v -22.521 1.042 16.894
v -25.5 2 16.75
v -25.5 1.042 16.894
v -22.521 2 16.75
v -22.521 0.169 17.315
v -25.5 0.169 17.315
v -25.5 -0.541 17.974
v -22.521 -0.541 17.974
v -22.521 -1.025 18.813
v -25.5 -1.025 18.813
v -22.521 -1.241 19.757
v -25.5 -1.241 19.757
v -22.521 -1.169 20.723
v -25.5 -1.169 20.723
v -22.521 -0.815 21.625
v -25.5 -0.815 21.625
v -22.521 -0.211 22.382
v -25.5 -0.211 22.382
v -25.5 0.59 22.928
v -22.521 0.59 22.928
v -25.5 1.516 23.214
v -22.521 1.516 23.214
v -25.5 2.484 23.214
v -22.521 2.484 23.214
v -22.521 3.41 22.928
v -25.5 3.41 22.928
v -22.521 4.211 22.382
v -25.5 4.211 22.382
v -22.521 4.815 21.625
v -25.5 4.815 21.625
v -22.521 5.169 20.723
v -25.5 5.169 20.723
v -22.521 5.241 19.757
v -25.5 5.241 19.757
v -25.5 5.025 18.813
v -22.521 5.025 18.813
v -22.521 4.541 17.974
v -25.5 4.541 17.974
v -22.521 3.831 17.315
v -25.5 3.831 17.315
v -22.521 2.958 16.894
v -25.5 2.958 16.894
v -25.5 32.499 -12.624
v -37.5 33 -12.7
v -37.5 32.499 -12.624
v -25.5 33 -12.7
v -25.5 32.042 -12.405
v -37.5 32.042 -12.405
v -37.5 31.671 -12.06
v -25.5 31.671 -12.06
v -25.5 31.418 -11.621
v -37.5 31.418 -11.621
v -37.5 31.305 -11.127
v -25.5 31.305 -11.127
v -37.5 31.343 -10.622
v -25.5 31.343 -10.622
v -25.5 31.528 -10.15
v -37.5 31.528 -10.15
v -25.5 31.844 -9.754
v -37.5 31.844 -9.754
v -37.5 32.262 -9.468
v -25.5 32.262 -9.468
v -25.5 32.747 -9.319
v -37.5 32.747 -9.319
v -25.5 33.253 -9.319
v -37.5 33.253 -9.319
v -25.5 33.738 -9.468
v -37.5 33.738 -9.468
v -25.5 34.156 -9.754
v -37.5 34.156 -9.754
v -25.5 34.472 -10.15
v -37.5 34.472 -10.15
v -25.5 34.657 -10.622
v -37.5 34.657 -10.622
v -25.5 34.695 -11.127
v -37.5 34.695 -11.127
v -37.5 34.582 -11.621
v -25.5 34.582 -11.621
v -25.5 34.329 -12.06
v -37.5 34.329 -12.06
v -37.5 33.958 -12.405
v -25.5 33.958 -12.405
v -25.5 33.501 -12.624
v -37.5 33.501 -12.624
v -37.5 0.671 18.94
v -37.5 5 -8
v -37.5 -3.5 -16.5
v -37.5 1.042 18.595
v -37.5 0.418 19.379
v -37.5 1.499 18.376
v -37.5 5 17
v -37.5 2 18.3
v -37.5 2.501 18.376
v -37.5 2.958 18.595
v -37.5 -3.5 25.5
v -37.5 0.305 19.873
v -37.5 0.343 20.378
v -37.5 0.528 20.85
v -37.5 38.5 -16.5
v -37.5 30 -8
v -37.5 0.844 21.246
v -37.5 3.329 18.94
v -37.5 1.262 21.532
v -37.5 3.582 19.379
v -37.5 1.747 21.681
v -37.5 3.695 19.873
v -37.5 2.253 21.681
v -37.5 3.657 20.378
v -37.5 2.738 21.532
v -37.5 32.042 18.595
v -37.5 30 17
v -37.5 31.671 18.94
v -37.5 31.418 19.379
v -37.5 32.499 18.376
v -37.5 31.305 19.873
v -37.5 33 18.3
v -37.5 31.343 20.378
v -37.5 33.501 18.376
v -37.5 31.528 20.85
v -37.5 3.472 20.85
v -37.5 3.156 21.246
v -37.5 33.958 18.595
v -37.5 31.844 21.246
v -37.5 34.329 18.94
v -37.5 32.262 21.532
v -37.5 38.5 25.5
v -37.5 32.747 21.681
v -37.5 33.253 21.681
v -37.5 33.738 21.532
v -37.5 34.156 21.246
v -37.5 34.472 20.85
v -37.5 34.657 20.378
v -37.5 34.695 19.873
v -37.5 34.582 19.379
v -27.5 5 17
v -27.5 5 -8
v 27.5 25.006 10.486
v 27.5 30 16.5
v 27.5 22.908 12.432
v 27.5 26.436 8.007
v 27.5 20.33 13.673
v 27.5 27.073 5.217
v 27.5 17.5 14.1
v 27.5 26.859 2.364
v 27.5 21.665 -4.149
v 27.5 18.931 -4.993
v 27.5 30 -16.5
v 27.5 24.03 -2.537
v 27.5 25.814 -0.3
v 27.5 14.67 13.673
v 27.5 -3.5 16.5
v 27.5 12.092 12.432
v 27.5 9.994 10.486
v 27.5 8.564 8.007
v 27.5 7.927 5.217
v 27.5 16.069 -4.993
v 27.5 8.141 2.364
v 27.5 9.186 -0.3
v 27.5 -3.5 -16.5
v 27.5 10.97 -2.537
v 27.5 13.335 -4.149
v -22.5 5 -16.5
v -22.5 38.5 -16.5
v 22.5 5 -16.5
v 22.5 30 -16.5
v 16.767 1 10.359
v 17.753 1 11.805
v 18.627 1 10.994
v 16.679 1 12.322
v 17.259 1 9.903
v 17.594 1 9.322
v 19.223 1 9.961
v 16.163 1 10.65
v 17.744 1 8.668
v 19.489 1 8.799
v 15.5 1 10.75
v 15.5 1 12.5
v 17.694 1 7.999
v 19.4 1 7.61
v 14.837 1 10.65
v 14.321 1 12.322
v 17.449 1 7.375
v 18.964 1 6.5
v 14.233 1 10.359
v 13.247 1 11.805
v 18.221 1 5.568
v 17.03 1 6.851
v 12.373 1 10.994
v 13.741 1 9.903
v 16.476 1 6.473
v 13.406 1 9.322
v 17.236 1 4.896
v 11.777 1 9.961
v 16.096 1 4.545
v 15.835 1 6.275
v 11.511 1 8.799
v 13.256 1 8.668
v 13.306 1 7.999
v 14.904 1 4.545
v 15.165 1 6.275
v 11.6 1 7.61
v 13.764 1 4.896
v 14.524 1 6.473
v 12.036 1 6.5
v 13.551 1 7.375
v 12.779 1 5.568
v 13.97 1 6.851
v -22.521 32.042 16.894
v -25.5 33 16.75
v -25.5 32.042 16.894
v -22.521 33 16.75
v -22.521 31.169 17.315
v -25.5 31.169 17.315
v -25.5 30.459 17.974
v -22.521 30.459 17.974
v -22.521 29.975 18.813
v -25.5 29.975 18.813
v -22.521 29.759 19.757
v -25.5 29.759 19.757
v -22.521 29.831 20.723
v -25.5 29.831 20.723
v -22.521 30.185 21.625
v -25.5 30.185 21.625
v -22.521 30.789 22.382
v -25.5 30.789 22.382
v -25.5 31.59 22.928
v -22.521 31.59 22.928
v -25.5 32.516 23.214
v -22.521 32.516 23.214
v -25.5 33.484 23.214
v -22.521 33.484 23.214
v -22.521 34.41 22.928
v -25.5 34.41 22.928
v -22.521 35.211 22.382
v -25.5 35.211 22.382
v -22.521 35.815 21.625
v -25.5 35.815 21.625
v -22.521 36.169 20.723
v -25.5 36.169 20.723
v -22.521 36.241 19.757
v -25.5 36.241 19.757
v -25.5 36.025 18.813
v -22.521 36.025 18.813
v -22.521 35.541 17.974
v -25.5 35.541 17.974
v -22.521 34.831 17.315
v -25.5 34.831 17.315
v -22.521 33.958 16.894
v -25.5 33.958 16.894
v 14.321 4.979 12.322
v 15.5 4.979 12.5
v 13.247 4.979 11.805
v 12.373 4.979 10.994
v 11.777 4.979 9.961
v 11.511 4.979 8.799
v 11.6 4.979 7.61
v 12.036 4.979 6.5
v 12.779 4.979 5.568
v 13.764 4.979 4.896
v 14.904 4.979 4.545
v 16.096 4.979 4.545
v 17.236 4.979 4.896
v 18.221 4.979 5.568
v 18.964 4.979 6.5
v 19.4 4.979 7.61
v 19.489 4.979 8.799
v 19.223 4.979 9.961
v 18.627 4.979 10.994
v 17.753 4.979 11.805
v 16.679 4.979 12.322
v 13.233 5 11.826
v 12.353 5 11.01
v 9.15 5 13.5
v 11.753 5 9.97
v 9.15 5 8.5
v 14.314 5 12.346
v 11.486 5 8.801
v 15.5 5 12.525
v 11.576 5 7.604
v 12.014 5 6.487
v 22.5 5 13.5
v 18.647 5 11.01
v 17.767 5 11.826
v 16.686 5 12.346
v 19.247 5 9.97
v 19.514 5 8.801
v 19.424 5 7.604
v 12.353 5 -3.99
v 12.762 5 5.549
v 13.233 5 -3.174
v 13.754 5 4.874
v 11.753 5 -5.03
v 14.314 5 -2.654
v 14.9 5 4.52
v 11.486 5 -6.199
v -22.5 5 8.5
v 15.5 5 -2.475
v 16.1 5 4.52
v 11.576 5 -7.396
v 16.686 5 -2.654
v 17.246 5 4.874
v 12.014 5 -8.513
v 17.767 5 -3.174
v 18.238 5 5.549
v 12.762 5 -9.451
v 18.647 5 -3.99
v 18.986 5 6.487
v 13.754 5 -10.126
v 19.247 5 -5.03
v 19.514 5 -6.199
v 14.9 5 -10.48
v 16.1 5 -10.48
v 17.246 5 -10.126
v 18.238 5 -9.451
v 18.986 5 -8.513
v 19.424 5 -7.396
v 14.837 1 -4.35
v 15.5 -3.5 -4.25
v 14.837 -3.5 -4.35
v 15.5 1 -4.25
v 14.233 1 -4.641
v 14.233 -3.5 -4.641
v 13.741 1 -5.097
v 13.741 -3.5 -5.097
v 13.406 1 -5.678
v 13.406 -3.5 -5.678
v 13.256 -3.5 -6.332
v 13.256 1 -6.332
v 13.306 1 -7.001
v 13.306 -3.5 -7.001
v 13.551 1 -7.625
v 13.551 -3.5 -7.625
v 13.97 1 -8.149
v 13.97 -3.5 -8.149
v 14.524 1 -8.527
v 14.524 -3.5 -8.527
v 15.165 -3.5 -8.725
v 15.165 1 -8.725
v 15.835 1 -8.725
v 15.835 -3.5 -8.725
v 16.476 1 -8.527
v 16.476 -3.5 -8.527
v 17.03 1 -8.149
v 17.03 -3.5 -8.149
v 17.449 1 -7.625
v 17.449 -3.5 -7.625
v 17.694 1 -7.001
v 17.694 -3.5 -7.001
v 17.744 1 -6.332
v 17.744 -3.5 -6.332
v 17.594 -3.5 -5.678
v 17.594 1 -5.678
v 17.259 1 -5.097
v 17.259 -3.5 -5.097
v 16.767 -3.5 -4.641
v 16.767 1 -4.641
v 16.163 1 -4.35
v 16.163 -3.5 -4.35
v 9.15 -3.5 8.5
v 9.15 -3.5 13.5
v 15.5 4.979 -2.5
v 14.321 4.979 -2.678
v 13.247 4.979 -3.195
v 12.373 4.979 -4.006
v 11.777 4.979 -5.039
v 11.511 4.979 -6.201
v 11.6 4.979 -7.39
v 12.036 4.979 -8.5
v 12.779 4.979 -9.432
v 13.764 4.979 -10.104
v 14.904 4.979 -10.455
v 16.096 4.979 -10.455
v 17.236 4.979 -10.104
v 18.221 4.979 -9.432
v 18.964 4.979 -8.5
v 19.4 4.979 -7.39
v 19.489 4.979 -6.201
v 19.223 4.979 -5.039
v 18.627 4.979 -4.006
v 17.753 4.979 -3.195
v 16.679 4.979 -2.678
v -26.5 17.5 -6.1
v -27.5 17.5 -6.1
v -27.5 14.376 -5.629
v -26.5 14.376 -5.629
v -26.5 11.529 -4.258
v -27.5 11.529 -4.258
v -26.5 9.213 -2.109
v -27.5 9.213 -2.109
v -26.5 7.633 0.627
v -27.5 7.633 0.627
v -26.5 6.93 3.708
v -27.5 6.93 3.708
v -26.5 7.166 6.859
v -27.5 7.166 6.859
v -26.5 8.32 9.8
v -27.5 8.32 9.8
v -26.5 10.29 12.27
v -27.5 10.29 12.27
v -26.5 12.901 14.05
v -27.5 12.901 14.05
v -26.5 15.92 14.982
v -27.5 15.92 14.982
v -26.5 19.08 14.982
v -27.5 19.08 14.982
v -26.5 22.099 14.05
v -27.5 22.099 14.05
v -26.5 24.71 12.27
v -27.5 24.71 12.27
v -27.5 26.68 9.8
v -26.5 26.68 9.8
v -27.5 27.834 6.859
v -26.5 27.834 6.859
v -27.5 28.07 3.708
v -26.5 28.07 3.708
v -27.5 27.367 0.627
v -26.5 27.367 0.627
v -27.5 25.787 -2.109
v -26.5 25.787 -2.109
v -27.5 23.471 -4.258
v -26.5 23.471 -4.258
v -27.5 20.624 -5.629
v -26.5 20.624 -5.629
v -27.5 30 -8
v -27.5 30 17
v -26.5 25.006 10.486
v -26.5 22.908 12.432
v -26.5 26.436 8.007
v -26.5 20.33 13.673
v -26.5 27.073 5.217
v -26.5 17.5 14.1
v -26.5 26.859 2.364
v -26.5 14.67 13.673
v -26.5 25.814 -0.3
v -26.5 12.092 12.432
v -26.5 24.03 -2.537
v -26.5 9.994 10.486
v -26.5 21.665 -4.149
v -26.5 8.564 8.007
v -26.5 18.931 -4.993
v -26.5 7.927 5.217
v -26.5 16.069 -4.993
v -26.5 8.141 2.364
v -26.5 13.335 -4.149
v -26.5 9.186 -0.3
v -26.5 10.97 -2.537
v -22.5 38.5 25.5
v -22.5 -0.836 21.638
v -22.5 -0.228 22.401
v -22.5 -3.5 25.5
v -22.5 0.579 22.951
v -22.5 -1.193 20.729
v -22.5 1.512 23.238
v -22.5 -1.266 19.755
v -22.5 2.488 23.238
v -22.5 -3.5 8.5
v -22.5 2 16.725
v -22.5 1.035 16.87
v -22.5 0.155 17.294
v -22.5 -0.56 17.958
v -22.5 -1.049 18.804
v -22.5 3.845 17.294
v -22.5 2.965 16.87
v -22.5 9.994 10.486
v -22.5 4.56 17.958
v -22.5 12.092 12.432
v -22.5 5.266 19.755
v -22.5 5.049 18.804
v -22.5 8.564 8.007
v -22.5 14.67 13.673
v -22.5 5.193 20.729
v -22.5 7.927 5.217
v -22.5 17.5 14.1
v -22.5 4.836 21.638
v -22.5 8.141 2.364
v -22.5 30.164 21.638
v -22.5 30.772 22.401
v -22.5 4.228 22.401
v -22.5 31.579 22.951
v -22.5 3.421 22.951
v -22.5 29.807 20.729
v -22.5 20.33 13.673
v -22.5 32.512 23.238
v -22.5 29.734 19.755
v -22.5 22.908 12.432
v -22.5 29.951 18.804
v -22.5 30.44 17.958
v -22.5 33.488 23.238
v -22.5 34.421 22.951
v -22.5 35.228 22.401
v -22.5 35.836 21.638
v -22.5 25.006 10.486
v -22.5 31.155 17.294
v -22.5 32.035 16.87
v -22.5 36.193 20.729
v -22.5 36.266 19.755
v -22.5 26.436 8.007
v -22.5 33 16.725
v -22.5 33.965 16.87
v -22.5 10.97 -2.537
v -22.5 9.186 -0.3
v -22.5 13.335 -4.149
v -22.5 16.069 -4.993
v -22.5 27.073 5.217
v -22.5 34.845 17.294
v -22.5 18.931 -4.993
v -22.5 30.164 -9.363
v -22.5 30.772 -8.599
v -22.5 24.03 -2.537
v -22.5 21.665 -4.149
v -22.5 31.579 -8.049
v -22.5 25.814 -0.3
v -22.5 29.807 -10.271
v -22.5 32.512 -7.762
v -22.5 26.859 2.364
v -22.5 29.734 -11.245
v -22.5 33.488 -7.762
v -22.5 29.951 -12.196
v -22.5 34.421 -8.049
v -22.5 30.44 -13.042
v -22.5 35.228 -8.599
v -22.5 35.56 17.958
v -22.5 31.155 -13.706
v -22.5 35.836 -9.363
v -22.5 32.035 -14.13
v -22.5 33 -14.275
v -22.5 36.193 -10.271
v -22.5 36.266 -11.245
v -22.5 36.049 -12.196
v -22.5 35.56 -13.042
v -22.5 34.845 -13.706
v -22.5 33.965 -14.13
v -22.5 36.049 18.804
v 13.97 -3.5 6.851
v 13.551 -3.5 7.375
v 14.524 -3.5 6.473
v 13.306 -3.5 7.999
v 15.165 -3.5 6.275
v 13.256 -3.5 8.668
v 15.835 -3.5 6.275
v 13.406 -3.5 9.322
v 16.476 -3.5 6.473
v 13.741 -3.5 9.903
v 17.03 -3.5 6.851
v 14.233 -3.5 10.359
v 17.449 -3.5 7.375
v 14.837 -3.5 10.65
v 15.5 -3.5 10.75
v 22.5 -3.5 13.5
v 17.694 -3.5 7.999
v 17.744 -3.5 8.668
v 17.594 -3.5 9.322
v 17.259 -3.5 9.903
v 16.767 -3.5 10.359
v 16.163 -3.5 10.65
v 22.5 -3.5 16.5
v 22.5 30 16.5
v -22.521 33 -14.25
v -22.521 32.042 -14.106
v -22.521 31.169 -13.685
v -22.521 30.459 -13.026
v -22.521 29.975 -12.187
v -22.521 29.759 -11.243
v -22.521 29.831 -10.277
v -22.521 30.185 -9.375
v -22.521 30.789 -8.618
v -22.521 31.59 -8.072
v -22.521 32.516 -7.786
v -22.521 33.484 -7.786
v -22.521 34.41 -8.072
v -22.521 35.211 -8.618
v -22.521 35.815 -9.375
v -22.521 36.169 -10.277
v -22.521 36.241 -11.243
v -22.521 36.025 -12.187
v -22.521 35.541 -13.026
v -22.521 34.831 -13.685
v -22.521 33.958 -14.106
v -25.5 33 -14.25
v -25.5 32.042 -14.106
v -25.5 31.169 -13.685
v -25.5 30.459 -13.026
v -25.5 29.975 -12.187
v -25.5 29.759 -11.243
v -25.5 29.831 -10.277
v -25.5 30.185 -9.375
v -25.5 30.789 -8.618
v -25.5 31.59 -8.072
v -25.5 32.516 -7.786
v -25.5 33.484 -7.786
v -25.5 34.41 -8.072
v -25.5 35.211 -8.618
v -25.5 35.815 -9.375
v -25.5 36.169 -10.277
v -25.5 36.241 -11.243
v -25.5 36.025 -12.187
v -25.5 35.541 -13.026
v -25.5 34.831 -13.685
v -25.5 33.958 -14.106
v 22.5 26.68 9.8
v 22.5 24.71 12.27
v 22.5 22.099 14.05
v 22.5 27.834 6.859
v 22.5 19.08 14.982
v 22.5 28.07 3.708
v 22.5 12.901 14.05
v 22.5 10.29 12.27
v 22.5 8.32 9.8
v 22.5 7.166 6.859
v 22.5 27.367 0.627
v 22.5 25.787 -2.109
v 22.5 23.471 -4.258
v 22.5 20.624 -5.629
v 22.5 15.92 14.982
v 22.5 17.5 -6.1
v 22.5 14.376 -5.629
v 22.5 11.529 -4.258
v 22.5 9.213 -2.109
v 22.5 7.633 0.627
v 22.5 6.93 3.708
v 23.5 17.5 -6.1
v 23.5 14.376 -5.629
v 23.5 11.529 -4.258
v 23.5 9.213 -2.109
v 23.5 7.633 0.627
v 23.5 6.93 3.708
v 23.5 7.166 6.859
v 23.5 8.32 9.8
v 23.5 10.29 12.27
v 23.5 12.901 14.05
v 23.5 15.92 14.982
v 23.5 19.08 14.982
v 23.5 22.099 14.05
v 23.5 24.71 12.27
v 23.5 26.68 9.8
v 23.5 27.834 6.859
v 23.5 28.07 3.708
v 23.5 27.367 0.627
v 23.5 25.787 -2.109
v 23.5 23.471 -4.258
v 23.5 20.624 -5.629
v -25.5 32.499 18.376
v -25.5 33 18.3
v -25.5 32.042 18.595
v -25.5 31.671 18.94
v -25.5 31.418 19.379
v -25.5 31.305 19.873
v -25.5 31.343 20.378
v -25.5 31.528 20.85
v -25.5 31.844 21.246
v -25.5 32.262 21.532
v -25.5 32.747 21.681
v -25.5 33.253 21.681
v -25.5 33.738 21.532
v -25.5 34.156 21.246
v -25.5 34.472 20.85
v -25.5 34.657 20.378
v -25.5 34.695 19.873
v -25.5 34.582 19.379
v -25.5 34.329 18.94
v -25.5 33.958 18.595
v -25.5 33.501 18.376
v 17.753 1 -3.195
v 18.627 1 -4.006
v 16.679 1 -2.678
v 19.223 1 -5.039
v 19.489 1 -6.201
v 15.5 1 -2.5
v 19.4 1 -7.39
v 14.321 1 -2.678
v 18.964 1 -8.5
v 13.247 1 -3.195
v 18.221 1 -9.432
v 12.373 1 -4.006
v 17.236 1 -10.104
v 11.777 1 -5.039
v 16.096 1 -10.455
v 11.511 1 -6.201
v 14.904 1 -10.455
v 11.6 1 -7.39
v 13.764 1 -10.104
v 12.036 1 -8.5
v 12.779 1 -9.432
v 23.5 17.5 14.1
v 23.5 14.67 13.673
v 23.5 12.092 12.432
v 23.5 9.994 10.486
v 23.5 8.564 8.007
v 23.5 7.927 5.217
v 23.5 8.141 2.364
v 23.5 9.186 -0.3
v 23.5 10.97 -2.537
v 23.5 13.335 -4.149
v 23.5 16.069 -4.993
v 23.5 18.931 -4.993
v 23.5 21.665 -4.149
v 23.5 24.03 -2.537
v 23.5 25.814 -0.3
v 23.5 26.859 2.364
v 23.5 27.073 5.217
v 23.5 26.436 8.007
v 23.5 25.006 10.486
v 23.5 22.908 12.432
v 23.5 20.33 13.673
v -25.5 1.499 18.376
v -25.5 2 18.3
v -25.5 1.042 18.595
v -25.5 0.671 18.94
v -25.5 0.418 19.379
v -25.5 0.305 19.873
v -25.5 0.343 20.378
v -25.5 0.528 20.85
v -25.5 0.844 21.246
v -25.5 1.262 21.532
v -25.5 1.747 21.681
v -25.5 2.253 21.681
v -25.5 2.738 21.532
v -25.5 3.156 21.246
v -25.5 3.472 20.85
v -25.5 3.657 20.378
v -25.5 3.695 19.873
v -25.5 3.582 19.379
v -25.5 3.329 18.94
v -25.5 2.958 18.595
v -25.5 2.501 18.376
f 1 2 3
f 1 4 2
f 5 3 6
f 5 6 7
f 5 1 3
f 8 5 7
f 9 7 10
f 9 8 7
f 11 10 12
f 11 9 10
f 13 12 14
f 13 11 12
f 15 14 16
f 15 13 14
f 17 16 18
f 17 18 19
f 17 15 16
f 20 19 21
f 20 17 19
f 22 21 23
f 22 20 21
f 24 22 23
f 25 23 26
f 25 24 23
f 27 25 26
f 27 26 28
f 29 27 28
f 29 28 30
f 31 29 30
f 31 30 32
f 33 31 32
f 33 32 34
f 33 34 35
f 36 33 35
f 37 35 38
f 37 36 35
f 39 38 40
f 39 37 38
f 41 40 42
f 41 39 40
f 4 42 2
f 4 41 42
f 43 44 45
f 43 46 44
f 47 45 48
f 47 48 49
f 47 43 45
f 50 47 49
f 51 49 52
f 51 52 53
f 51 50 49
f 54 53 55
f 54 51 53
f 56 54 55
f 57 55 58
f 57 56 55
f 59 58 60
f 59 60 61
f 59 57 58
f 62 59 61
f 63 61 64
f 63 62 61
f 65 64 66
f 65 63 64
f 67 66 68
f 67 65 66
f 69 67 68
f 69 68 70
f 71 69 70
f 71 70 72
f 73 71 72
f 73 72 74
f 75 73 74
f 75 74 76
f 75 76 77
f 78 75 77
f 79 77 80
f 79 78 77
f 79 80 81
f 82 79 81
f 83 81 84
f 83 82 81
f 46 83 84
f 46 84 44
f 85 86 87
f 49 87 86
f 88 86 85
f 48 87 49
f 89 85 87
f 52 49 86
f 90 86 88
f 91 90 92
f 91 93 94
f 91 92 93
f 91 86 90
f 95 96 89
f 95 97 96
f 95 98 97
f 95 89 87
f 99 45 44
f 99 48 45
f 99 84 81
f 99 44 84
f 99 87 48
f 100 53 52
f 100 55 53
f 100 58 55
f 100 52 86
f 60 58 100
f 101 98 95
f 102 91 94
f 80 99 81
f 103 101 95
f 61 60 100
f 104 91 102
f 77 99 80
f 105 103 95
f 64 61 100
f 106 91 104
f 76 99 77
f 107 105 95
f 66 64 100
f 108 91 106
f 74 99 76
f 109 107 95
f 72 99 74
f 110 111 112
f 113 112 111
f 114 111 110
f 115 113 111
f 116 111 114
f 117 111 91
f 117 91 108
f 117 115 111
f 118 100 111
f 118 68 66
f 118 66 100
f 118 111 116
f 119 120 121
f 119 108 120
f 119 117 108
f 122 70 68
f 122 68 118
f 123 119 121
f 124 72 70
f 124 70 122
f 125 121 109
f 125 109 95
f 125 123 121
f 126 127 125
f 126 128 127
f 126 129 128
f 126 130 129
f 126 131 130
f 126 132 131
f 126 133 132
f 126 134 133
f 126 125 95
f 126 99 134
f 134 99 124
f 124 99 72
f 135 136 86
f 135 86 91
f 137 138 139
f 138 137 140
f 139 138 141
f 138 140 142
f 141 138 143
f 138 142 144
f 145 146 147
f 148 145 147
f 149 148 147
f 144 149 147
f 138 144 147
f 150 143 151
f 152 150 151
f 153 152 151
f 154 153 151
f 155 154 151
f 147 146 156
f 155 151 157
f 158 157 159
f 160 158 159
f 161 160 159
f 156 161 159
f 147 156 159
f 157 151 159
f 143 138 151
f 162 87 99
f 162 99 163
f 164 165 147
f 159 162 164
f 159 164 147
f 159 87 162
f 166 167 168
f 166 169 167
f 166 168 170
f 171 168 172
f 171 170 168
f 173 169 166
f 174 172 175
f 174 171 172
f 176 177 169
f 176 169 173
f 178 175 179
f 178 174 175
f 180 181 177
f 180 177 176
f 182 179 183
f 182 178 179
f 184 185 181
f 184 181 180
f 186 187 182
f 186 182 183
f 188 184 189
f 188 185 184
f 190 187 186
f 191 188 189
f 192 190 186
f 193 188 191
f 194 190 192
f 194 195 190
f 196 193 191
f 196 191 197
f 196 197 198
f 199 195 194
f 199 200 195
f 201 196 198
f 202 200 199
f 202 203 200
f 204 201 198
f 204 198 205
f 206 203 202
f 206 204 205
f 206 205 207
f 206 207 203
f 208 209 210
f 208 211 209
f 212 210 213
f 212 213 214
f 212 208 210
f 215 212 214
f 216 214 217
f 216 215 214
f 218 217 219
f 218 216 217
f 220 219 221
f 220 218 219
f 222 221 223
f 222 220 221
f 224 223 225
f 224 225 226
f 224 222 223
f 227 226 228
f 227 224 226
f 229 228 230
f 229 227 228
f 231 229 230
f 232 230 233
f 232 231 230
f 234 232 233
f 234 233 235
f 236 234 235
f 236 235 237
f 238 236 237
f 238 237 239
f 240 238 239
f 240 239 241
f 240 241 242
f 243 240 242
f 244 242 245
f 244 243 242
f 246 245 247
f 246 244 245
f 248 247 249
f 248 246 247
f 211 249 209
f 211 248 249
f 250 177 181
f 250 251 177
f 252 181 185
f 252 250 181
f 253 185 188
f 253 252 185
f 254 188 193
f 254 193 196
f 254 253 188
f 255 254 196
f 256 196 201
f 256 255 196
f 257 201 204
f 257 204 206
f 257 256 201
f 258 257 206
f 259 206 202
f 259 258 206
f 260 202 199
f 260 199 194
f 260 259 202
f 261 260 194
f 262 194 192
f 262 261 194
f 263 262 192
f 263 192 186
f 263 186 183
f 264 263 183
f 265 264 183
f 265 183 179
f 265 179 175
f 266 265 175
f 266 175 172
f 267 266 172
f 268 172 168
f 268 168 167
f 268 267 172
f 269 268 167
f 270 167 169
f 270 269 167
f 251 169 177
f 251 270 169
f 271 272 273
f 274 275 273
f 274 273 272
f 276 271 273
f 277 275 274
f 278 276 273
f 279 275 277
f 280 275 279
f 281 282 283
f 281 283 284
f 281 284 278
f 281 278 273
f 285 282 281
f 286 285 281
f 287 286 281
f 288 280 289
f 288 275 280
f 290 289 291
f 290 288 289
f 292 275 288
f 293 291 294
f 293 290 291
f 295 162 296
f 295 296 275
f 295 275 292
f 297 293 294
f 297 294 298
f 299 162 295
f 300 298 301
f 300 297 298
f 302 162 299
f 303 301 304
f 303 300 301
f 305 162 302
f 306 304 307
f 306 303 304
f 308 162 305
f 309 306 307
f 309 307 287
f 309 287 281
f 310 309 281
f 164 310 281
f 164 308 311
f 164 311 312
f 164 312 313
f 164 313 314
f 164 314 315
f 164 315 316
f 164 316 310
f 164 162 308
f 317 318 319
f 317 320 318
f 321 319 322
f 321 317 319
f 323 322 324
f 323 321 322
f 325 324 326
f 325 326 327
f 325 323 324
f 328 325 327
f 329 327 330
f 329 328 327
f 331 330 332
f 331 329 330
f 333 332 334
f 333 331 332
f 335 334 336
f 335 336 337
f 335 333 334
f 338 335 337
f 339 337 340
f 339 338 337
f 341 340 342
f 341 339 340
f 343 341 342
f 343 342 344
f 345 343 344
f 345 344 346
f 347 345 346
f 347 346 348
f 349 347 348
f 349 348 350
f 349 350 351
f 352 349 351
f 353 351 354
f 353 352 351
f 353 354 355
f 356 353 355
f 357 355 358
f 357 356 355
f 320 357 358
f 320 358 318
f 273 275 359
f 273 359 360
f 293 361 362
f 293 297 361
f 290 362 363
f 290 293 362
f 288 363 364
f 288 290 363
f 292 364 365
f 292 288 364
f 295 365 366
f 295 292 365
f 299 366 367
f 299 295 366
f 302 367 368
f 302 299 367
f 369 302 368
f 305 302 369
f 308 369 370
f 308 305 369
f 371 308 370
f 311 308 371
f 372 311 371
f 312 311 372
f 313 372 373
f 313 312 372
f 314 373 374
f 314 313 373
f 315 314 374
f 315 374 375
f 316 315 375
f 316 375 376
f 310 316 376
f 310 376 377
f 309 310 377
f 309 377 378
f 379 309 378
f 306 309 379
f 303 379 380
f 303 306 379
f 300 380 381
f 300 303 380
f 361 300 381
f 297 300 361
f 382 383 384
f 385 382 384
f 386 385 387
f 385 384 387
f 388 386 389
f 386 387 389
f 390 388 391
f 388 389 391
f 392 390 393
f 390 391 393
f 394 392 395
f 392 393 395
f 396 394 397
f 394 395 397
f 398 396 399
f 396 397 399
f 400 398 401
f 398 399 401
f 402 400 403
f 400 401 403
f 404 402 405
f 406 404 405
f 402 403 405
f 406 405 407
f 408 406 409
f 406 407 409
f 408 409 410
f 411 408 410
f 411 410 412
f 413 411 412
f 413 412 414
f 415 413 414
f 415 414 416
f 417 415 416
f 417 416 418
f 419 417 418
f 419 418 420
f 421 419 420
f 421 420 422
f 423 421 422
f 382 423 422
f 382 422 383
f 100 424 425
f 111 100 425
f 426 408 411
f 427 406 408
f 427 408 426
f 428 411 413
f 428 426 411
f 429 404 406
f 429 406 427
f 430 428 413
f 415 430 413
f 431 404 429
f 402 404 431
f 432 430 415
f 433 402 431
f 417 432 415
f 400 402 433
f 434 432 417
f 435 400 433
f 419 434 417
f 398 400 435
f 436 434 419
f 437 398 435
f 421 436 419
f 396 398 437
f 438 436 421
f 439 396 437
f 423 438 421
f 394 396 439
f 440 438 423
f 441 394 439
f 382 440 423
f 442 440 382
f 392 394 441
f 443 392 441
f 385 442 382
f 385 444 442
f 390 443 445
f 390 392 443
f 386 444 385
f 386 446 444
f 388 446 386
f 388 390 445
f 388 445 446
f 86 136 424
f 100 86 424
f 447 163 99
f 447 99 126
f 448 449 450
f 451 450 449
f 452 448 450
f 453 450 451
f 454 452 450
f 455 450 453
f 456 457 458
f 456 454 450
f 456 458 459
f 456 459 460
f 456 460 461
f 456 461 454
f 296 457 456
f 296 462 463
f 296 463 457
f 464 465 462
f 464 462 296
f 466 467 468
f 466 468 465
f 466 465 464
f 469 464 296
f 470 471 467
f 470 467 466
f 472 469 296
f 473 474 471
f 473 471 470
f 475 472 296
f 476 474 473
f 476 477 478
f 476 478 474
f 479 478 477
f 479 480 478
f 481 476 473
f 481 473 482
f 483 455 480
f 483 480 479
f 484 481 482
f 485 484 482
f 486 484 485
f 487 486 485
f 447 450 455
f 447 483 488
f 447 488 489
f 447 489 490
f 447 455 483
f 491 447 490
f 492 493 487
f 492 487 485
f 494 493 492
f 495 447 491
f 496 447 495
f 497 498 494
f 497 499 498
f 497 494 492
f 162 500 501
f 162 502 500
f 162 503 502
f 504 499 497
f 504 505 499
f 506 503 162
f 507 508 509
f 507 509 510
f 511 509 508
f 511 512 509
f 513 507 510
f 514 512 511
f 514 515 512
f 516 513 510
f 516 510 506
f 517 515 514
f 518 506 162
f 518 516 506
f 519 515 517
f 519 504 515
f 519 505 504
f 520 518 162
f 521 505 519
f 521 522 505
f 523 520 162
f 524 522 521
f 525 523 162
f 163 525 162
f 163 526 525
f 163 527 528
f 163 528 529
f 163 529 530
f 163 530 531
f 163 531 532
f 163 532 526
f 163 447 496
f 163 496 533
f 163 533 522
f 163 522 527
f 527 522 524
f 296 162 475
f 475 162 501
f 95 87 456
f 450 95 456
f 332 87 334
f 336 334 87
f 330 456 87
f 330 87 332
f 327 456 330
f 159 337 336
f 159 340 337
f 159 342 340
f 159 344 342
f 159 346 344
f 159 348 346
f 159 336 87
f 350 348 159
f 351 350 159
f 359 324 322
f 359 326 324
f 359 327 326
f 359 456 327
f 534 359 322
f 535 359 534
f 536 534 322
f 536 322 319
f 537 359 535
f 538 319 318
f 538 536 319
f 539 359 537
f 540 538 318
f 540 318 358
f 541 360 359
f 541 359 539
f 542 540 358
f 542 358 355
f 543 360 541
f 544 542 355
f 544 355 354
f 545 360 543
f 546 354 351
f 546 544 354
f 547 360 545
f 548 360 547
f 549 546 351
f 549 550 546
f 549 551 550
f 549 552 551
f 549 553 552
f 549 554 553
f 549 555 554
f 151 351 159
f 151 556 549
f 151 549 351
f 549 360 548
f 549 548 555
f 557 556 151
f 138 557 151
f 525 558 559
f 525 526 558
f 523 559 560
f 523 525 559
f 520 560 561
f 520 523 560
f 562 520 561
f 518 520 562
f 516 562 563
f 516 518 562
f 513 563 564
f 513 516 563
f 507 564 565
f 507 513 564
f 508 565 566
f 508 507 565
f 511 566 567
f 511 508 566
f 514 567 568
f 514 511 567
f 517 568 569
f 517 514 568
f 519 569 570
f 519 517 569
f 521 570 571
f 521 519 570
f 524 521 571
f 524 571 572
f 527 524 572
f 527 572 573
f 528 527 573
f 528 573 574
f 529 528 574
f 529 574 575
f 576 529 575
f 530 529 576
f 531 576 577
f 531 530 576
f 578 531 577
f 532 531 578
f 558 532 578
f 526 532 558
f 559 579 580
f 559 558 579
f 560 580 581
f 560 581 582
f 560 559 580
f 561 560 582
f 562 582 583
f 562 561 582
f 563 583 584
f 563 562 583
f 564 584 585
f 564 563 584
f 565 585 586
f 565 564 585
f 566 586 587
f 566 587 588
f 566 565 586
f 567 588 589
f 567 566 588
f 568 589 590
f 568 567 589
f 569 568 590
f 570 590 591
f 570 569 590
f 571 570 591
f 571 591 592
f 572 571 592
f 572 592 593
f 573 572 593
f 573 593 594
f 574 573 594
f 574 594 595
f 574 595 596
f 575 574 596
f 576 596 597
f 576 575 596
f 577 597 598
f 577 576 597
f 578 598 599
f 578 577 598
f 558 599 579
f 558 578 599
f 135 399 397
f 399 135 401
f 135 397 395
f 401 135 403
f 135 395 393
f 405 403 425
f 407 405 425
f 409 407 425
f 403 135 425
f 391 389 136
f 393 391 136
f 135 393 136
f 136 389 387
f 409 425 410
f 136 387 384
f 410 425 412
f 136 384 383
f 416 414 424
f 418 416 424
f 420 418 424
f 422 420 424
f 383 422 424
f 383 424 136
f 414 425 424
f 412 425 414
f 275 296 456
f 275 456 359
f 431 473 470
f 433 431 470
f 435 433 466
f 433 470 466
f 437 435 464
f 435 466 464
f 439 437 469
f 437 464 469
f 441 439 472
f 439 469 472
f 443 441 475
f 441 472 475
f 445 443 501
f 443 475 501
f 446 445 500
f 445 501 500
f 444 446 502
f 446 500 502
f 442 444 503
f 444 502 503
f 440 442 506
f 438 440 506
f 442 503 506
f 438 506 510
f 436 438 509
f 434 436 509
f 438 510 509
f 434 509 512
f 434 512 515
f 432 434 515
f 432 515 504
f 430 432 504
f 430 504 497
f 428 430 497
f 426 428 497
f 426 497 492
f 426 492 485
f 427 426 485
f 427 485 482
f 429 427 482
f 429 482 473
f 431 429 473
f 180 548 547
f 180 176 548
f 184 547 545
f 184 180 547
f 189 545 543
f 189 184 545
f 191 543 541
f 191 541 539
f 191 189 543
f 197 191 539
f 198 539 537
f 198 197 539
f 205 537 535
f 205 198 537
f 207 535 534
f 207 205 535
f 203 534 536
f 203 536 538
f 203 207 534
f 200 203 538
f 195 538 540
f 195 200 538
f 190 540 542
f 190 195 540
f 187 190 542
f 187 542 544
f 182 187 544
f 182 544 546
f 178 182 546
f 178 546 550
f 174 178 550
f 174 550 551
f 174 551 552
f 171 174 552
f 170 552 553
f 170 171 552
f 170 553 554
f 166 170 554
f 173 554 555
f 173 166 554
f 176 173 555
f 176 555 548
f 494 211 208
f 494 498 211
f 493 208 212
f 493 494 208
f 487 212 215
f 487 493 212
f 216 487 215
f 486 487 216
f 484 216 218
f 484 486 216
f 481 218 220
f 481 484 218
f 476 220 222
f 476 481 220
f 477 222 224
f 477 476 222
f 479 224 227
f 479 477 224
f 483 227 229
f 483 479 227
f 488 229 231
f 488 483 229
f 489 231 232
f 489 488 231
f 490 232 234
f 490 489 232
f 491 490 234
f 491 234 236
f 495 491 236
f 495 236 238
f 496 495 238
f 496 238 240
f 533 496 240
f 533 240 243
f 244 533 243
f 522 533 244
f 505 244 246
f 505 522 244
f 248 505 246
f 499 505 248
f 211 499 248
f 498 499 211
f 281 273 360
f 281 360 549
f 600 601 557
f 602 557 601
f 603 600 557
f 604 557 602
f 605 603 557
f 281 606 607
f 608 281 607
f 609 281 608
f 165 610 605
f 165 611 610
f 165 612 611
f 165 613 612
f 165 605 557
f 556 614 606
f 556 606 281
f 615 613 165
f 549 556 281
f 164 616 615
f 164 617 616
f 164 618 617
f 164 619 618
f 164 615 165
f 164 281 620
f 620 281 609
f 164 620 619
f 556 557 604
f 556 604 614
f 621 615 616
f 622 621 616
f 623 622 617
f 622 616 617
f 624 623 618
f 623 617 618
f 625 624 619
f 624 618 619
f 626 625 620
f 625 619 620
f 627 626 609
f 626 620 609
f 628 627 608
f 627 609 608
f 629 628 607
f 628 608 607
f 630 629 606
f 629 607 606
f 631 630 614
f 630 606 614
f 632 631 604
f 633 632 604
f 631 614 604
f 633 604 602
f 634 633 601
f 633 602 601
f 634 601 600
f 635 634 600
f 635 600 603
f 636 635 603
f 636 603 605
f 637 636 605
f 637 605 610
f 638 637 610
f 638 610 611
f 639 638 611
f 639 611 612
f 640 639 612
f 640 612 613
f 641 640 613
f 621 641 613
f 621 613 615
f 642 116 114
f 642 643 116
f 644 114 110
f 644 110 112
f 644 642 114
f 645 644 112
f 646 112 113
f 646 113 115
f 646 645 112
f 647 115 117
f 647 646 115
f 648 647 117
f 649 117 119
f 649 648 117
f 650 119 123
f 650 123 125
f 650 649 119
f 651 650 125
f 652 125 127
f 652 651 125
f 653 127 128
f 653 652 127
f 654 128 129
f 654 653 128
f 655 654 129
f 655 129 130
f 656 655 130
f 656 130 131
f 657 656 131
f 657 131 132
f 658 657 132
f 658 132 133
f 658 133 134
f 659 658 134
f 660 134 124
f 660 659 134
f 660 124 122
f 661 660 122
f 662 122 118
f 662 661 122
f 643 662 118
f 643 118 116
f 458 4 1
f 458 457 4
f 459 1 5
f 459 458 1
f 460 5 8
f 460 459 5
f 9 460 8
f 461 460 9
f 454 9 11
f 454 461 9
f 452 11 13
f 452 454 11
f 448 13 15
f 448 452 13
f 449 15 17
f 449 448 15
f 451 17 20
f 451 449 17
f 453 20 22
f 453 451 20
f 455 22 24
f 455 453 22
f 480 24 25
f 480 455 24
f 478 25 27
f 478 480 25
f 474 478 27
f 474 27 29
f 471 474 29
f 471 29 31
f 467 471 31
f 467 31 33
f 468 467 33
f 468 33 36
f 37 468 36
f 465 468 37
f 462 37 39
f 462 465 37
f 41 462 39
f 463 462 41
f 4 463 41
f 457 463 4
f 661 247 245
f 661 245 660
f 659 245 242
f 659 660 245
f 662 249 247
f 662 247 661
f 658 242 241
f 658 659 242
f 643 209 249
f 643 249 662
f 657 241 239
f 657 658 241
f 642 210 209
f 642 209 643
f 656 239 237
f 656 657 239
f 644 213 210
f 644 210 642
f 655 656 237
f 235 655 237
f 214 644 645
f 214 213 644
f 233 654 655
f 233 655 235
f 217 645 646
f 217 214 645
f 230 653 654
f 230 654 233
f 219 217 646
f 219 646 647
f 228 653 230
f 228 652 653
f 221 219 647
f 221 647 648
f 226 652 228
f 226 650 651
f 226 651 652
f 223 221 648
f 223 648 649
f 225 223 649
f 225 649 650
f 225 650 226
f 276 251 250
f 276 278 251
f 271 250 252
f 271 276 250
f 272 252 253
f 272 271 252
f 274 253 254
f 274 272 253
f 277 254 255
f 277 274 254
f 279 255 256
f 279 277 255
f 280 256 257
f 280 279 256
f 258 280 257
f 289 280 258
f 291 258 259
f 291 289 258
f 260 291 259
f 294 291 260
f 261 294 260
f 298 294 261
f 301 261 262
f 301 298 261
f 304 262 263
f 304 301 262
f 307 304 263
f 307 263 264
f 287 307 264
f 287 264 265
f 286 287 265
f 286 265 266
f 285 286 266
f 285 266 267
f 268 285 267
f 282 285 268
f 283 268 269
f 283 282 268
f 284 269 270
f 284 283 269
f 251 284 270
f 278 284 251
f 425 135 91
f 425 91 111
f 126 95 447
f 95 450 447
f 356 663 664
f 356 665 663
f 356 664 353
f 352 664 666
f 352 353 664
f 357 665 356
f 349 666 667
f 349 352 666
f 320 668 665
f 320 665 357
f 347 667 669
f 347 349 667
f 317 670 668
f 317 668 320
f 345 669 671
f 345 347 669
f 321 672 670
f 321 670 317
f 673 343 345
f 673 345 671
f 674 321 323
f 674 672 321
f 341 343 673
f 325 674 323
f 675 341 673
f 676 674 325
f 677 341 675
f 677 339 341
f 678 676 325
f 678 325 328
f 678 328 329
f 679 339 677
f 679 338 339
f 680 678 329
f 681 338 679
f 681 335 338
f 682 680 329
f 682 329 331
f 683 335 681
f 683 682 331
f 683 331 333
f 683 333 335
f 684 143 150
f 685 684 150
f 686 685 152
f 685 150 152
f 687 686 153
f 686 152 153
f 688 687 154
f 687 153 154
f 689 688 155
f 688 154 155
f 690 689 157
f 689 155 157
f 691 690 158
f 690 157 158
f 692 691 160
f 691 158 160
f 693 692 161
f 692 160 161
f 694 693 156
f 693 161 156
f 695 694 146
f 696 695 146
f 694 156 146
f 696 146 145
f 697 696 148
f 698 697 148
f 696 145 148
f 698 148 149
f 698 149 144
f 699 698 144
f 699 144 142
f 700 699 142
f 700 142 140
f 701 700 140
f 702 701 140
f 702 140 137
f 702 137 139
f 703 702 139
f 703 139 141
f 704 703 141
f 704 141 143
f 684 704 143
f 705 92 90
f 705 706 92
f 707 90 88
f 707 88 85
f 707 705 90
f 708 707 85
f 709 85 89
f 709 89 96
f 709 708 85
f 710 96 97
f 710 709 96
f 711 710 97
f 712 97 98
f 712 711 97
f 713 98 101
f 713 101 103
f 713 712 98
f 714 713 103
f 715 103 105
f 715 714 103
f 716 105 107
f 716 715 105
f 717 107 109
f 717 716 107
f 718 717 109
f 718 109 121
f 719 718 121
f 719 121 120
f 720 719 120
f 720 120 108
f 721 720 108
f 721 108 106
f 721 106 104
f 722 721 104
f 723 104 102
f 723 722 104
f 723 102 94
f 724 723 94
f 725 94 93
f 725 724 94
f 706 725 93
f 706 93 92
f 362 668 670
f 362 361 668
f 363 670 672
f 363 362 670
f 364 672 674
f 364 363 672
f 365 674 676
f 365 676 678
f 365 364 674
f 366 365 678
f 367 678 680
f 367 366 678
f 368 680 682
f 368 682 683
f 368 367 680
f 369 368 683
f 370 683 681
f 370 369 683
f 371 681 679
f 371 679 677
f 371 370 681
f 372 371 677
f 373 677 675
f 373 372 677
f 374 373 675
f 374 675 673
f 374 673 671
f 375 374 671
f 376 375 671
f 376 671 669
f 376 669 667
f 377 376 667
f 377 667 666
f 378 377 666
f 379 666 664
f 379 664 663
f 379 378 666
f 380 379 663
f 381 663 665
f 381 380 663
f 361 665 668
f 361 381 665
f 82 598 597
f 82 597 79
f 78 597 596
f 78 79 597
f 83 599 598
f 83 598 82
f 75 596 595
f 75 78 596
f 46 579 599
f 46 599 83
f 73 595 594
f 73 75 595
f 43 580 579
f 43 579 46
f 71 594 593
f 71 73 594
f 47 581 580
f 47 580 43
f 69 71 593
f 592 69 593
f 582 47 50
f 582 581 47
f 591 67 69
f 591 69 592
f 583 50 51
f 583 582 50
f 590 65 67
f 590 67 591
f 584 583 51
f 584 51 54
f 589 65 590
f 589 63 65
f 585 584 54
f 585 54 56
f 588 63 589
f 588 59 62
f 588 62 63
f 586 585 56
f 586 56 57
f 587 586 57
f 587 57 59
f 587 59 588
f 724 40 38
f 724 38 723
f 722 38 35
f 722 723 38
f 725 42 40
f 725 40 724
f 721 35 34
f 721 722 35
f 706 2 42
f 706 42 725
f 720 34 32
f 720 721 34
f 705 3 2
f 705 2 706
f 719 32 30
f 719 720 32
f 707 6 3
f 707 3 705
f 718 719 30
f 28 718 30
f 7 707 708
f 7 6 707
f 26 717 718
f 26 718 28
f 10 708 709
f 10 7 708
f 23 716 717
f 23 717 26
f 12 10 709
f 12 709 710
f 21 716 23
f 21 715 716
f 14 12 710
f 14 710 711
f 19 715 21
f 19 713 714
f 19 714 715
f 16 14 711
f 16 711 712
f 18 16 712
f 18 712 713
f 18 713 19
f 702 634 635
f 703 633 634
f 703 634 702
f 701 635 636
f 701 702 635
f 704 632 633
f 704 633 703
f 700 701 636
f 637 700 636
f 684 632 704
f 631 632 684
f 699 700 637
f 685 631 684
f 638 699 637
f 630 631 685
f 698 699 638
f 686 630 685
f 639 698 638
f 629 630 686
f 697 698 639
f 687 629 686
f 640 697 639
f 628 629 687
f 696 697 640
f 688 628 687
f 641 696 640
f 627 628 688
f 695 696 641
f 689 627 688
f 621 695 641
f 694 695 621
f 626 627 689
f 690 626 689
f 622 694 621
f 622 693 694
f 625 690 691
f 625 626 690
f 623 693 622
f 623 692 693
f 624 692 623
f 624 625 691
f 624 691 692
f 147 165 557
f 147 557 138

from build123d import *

# Parameters (mm, degrees)
SKETCH1_W                     = 55
SKETCH1_H                     = 33
BOSS_EXTRUDE1_DEPTH           = 5
SKETCH2_W                     = 5
SKETCH2_H                     = 24
BOSS_EXTRUDE2_DEPTH           = 25
HOLE1_D                       = 19.2
HOLE1_DEPTH                   = 5
HOLE1_CBORE_D                 = 21.2
HOLE1_CBORE_DEPTH             = 1
HOLE2_D                       = 19.2
HOLE2_DEPTH                   = 5
HOLE2_CBORE_D                 = 21.2
HOLE2_CBORE_DEPTH             = 1
BOSS_EXTRUDE3_DEPTH           = 5
SKETCH13_W                    = 42
SKETCH13_H                    = 42
SKETCH13_W_2                  = 25
SKETCH13_H_2                  = 25
BOSS_EXTRUDE4_DEPTH           = 10
CBORE_FOR_M3_SHCS3_AT_2_COUNT = 2
CBORE_FOR_M3_SHCS3_AT_2_PITCH = 31
CBORE_FOR_M3_SHCS3_AT_3_COUNT = 2
CBORE_FOR_M3_SHCS3_AT_3_PITCH = 43.840620434
SKETCH23_W                    = 50
SKETCH23_H                    = 33
BOSS_EXTRUDE6_DEPTH           = 3.5
CBORE_FOR_M4_SHCS1_AT_2_COUNT = 2
CBORE_FOR_M4_SHCS1_AT_2_PITCH = 15
CUT_EXTRUDE3_DEPTH            = 57.380404397
SKETCH24_W                    = 5
SKETCH24_H                    = 9
BOSS_EXTRUDE7_DEPTH           = 25


with BuildPart() as part:
    # Sketch1 → Boss-Extrude1 (new body)
    with BuildSketch(Plane(origin=(0, 0, 0), x_dir=(1, 0, 0), z_dir=(0, 1, 0))):
        Rectangle(SKETCH1_W, SKETCH1_H)
    extrude(amount=BOSS_EXTRUDE1_DEPTH)

    # Sketch2 → Boss-Extrude2 (add)
    with BuildSketch(Plane(origin=(0, 5, 0), x_dir=(1, 0, 0), z_dir=(0, 1, 0))):
        with Locations((-25, -4.5)):
            Rectangle(SKETCH2_W, SKETCH2_H)
        with Locations((25, -4.5)):
            Rectangle(SKETCH2_W, SKETCH2_H)
    extrude(amount=BOSS_EXTRUDE2_DEPTH)

    # Hole1
    with Locations(Plane(origin=(-27.5, 0, 0), x_dir=(0, 0, -1), z_dir=(-1, 0, 0))):
        with Locations((-4.5, -17.5)):
            CounterBoreHole(HOLE1_D / 2, HOLE1_CBORE_D / 2, HOLE1_CBORE_DEPTH, depth=HOLE1_DEPTH)

    # Hole2
    with Locations(Plane(origin=(22.5, 0, 0), x_dir=(0, 0, -1), z_dir=(-1, 0, 0))):
        with Locations((-4.5, -17.5)):
            CounterBoreHole(HOLE2_D / 2, HOLE2_CBORE_D / 2, HOLE2_CBORE_DEPTH, depth=HOLE2_DEPTH)

    # Sketch12 → Boss-Extrude3 (add)
    with BuildSketch(Plane.ZY.offset(27.5)):
        Polygon((-16.5, 38.5), (25.5, 38.5), (25.5, -3.5), (-16.5, -3.5), (-16.5, 0), (16.5, 0), (16.5, 30), (-7.5, 30), (-7.5, 5), (-16.5, 5), align=None)
    extrude(amount=-BOSS_EXTRUDE3_DEPTH)

    # Sketch13 → Boss-Extrude4 (add)
    with BuildSketch(Plane.ZY.offset(27.5)):
        with Locations((4.5, 17.5)):
            Rectangle(SKETCH13_W, SKETCH13_H)
        with Locations((4.5, 17.5)):
            Rectangle(SKETCH13_W_2, SKETCH13_H_2, mode=Mode.SUBTRACT)
    extrude(amount=BOSS_EXTRUDE4_DEPTH)

    # Sketch15 → CBORE for M3 SHCS3 (revolve, cut)
    with BuildSketch(Plane(origin=(-22.5, 2, 20), x_dir=(0, 0, -1), z_dir=(0, 1, 0))):
        Polygon((0, 0), (0, 15), (1.7, 15), (1.7, 3), (3.25, 3), (3.25, 0.020977491), (3.275, 0), align=None)
    cbore_for_m3_shcs3 = revolve(axis=Axis((-16.15, 2, 20), (-1, 0, 0)), mode=Mode.SUBTRACT)

    # CBORE for M3 SHCS3 at 2: CBORE for M3 SHCS3 ×2
    with Locations(*[(0, i * CBORE_FOR_M3_SHCS3_AT_2_PITCH, 0) for i in range(1, CBORE_FOR_M3_SHCS3_AT_2_COUNT)]):
        add(cbore_for_m3_shcs3, mode=Mode.SUBTRACT)

    # CBORE for M3 SHCS3 at 3: CBORE for M3 SHCS3 ×2
    with Locations(*[Vector(0, 0.7071067811865476, -0.7071067811865476) * (i * CBORE_FOR_M3_SHCS3_AT_3_PITCH) for i in range(1, CBORE_FOR_M3_SHCS3_AT_3_COUNT)]):
        add(cbore_for_m3_shcs3, mode=Mode.SUBTRACT)

    # Sketch23 → Boss-Extrude6 (add)
    with BuildSketch(Plane.XZ):
        with Locations((2.5, 0)):
            Rectangle(SKETCH23_W, SKETCH23_H)
    extrude(amount=BOSS_EXTRUDE6_DEPTH)

    # Sketch10 → CBORE for M4 SHCS1 (revolve, cut)
    with BuildSketch(Plane(origin=(15.5, 5, -6.5), x_dir=(0, 0, 1), z_dir=(1, 0, 0))):
        Polygon((0, 0), (0, 8.5), (2.25, 8.5), (2.25, 4), (4, 4), (4, 0.020977491), (4.025, 0), align=None)
    cbore_for_m4_shcs1 = revolve(axis=Axis((15.5, 11.35, -6.5), (0, -1, 0)), mode=Mode.SUBTRACT)

    # CBORE for M4 SHCS1 at 2: CBORE for M4 SHCS1 ×2
    with Locations(*[(0, 0, i * CBORE_FOR_M4_SHCS1_AT_2_PITCH) for i in range(1, CBORE_FOR_M4_SHCS1_AT_2_COUNT)]):
        add(cbore_for_m4_shcs1, mode=Mode.SUBTRACT)

    # Sketch21 → Cut-Extrude3 (cut, through all)
    with BuildSketch(Plane(origin=(0, 5, 0), x_dir=(1, 0, 0), z_dir=(0, 1, 0))):
        Polygon((-22.5, -16.5), (-22.5, -8.5), (9.15, -8.5), (9.15, -13.5), (22.5, -13.5), (22.5, -16.5), align=None)
    extrude(amount=-CUT_EXTRUDE3_DEPTH, mode=Mode.SUBTRACT)

    # Sketch24 → Boss-Extrude7 (add)
    with BuildSketch(Plane(origin=(0, 5, 0), x_dir=(1, 0, 0), z_dir=(0, 1, 0))):
        with Locations((25, 12)):
            Rectangle(SKETCH24_W, SKETCH24_H)
    extrude(amount=BOSS_EXTRUDE7_DEPTH)


solid = part.part
